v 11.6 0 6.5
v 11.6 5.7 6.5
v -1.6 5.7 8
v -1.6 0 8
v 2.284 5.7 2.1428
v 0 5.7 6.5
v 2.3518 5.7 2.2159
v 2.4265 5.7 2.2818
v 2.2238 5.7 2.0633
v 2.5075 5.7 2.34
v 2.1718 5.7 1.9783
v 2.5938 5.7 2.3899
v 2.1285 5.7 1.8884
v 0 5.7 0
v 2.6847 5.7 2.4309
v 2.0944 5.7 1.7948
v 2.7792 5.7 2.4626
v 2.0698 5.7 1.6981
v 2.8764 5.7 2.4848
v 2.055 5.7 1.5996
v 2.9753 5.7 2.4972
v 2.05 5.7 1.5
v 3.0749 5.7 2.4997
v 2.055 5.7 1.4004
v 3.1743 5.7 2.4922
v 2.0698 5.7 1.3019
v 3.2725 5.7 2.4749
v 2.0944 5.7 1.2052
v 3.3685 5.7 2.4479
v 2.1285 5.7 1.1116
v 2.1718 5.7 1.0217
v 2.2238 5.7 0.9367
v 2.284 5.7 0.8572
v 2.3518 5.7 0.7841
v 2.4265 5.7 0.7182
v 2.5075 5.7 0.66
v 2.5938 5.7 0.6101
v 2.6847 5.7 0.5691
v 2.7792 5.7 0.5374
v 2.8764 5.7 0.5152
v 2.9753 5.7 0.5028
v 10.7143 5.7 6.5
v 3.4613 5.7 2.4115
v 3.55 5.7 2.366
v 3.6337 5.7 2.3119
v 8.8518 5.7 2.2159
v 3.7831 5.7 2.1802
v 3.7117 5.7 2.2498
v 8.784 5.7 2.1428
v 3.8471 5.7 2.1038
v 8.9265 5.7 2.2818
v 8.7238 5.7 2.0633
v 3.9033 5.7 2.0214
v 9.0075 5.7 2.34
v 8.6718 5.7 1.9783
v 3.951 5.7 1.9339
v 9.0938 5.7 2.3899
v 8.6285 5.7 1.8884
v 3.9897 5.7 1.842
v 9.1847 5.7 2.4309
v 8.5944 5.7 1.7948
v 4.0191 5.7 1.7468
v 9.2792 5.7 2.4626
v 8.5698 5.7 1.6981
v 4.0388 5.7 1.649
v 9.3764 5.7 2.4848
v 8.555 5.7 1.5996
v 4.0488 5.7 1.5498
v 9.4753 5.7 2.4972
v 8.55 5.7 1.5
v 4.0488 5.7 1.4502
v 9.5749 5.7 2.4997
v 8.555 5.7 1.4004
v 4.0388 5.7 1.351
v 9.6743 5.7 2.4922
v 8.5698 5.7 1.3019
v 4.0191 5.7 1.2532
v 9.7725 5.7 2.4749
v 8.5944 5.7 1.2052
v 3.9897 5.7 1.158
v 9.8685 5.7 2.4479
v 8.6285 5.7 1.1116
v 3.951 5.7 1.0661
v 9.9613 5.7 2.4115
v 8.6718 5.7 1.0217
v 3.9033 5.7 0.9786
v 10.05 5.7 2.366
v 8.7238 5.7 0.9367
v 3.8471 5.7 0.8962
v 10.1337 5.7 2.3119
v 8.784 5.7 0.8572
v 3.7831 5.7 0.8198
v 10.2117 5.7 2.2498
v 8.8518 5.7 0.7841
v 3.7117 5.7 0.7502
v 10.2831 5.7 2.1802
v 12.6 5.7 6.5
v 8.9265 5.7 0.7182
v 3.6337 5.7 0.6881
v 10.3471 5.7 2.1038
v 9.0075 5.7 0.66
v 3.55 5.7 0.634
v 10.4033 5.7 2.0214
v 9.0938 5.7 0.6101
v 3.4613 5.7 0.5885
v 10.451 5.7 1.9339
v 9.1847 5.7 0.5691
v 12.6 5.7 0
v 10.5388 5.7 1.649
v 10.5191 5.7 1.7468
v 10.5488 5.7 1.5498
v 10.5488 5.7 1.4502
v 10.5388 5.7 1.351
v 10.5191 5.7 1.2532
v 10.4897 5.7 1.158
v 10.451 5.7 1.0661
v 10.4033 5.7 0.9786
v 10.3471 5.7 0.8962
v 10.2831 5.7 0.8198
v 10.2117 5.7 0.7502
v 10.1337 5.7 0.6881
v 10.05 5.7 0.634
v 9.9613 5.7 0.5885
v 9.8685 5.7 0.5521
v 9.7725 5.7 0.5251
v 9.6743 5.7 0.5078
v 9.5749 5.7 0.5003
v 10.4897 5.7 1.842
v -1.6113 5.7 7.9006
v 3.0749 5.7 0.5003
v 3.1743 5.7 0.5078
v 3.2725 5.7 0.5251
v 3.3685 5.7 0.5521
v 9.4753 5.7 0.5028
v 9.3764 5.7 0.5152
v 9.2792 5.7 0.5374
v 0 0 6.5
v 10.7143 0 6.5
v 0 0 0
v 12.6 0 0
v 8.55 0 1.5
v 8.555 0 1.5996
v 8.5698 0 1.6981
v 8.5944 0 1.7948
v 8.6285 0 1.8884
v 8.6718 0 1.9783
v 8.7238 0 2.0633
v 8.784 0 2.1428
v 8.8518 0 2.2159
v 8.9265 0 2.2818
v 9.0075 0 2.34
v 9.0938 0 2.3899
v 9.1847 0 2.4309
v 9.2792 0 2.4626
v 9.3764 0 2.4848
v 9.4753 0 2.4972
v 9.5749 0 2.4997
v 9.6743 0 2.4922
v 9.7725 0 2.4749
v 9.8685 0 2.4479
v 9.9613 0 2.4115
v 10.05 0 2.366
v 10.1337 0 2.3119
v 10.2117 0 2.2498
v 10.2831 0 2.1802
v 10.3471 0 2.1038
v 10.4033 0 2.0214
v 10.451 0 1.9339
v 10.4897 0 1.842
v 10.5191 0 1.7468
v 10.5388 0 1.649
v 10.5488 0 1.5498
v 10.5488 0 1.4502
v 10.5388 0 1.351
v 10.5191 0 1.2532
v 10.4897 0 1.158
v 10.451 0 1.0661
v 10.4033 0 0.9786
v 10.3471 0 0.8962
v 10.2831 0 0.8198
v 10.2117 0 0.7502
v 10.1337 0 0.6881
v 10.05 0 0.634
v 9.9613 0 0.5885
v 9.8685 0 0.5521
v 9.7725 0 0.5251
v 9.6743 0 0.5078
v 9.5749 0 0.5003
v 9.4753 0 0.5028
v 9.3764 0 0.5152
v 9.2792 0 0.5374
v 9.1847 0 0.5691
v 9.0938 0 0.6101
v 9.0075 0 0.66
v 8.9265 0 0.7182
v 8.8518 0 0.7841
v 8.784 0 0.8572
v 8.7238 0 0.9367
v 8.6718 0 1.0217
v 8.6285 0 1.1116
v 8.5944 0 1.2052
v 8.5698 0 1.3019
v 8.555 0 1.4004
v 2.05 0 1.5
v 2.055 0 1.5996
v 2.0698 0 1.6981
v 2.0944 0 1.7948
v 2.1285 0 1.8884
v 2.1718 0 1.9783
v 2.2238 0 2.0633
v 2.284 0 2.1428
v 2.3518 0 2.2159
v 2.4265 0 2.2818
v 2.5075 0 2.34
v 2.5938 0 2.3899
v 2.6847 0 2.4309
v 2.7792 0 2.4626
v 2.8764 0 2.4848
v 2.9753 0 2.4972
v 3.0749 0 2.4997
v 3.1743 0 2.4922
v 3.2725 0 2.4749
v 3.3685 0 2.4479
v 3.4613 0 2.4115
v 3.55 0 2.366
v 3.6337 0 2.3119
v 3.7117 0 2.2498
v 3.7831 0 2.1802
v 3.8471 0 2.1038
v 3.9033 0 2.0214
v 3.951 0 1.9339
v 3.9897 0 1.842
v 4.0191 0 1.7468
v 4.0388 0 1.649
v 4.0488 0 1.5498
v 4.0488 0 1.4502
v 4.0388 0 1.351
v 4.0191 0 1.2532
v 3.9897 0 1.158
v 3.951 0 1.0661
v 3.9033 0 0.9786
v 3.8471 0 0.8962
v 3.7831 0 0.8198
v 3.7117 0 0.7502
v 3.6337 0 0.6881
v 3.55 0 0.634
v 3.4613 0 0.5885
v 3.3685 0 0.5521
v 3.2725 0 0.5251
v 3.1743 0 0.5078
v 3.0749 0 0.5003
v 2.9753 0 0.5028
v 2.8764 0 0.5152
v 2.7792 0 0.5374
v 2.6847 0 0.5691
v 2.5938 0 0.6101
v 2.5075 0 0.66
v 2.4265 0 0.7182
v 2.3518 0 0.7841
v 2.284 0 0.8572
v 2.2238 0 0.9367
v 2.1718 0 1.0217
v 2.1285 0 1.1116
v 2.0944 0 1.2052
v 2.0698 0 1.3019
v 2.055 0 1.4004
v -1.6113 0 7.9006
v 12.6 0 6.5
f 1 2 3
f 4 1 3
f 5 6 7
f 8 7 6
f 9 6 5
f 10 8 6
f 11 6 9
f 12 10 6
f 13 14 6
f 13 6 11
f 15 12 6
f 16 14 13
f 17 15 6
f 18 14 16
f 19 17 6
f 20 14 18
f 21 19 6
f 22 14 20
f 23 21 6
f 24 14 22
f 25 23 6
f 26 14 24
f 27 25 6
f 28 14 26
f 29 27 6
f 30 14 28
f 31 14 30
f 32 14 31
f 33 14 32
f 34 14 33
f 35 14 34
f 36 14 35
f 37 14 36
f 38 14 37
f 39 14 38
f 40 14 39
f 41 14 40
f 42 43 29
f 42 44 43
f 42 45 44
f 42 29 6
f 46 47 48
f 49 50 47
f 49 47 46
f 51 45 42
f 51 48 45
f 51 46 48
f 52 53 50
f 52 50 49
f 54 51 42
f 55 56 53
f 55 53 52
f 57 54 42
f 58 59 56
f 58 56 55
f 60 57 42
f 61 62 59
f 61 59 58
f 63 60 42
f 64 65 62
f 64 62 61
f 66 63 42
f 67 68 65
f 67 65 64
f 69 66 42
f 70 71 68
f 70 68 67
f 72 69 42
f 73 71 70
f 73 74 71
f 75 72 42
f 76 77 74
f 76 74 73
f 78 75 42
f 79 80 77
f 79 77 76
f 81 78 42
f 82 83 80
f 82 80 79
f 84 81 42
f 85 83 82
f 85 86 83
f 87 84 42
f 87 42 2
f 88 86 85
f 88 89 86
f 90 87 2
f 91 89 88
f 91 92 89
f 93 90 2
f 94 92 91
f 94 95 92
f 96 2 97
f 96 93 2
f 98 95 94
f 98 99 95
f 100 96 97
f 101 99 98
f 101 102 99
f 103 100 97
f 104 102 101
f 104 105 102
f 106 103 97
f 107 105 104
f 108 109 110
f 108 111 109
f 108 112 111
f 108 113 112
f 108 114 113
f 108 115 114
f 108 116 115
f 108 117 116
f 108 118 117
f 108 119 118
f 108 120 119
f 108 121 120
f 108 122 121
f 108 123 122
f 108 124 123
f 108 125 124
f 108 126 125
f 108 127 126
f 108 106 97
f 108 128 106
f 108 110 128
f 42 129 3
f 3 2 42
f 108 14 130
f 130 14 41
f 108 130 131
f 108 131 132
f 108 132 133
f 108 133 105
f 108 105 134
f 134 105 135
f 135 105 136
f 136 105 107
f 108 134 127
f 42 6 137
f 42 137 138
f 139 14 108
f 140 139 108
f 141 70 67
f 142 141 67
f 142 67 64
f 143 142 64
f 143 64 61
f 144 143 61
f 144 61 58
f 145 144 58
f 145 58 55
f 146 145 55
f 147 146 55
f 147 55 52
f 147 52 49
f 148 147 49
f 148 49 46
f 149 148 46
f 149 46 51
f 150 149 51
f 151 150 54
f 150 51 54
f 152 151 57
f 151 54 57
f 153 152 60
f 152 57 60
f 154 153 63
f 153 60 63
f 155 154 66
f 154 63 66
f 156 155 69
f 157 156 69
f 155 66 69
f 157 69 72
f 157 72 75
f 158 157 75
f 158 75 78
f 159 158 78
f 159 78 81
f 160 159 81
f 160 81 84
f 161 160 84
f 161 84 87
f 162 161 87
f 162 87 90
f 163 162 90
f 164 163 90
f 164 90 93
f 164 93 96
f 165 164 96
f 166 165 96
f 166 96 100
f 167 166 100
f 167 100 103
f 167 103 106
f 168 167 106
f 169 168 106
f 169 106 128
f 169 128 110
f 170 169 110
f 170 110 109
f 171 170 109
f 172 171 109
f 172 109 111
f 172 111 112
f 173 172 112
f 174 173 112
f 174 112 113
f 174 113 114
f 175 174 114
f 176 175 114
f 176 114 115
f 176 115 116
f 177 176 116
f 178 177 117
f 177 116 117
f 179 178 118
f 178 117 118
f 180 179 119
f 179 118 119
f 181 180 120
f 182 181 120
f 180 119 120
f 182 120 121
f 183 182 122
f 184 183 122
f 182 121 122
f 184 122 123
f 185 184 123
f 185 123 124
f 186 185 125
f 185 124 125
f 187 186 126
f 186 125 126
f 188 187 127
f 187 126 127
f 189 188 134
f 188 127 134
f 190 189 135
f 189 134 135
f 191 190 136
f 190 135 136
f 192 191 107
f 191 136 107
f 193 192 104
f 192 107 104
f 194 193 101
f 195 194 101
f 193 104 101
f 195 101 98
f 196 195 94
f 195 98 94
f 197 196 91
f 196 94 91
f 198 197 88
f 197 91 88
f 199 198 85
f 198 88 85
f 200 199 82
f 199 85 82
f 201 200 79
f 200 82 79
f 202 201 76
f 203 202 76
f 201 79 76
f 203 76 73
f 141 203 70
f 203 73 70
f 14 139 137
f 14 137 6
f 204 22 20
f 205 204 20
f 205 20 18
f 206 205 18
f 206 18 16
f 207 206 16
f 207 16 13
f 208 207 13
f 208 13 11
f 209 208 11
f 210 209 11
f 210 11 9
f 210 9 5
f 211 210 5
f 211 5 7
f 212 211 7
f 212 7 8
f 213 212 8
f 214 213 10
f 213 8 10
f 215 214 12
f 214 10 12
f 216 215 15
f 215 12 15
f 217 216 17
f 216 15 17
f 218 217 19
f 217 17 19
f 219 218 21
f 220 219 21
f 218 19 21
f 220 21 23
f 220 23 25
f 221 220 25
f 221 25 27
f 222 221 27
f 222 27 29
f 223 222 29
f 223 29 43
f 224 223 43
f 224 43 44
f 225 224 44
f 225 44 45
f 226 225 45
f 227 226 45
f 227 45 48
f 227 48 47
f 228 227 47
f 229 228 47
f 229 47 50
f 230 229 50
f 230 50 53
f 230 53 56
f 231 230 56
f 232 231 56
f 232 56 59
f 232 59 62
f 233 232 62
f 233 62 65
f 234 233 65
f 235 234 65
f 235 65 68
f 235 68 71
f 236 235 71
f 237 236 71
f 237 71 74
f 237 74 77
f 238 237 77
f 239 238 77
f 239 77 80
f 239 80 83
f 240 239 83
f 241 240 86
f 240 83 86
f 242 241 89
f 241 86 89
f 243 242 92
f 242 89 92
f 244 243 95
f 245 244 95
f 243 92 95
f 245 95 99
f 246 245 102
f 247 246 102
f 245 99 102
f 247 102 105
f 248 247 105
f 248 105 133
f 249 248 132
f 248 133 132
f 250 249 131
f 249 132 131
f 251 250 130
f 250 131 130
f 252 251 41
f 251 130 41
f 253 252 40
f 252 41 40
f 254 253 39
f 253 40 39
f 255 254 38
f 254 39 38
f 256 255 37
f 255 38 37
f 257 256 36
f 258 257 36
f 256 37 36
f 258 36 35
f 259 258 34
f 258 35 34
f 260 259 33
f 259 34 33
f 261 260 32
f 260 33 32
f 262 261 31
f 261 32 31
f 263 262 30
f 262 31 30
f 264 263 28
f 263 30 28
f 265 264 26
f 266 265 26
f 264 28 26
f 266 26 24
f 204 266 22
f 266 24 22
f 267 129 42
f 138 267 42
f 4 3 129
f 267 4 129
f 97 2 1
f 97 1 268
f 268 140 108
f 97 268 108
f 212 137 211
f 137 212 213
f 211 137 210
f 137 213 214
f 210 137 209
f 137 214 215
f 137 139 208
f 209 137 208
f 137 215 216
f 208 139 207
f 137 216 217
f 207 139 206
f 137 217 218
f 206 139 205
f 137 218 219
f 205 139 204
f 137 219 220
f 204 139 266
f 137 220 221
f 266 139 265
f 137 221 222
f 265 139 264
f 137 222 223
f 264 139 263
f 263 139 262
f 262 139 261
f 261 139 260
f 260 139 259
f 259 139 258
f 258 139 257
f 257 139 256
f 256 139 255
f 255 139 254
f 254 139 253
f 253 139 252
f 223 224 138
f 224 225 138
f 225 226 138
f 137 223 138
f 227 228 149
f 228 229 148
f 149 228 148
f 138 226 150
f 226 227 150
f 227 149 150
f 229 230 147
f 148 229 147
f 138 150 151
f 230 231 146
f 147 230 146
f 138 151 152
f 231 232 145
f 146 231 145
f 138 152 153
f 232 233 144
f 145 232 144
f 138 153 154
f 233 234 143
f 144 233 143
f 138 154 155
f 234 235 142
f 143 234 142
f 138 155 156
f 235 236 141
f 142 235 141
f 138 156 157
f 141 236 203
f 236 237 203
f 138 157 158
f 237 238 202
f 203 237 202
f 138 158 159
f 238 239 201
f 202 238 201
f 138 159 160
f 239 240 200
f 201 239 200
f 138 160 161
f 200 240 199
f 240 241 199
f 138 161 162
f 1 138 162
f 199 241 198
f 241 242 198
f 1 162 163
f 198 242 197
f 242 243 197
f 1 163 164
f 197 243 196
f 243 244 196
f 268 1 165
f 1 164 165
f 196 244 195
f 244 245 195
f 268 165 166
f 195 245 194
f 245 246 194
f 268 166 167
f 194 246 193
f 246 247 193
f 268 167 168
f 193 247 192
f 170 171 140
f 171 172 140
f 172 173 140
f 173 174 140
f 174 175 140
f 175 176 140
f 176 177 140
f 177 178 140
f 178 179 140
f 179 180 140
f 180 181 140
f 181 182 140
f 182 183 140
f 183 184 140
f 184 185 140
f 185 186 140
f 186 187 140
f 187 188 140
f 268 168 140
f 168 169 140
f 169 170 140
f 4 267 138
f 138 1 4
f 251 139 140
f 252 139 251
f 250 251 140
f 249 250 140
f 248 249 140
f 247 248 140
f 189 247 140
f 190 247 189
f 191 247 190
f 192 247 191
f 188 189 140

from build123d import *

# Parameters (mm, degrees)
SKETCH029_W     = 12.6
SKETCH029_H     = 5.7
PAD009_DEPTH    = 6.5
SKETCH030_R     = 1
POCKET025_DEPTH = 5.701
PAD010_DEPTH    = 5.7


with BuildPart() as part:
    # Sketch029 → Pad009 (new body)
    with BuildSketch(Plane.XY):
        with Locations((6.3, 2.85)):
            Rectangle(SKETCH029_W, SKETCH029_H)
    extrude(amount=PAD009_DEPTH)

    # Sketch030 (on Face1 of Pad009) → Pocket025 (cut, through all)
    with BuildSketch(Plane(origin=(0, 5.7, 0), x_dir=(-1, 0, 0), z_dir=(0, 1, 0))):
        with Locations((-9.55, 1.5)):
            Circle(SKETCH030_R)
        with Locations((-3.05, 1.5)):
            Circle(SKETCH030_R)
    extrude(amount=-POCKET025_DEPTH, mode=Mode.SUBTRACT)

    # Sketch031 (on Face1 of Pocket025) → Pad010 (join)
    with BuildSketch(Plane(origin=(0, 5.7, 0), x_dir=(-1, 0, 0), z_dir=(0, 1, 0))):
        Polygon((-11.6, 6.5), (1.6, 8), (1.611291, 7.900639), (-10.714336, 6.5), align=None)
    extrude(amount=-PAD010_DEPTH)


solid = part.part
